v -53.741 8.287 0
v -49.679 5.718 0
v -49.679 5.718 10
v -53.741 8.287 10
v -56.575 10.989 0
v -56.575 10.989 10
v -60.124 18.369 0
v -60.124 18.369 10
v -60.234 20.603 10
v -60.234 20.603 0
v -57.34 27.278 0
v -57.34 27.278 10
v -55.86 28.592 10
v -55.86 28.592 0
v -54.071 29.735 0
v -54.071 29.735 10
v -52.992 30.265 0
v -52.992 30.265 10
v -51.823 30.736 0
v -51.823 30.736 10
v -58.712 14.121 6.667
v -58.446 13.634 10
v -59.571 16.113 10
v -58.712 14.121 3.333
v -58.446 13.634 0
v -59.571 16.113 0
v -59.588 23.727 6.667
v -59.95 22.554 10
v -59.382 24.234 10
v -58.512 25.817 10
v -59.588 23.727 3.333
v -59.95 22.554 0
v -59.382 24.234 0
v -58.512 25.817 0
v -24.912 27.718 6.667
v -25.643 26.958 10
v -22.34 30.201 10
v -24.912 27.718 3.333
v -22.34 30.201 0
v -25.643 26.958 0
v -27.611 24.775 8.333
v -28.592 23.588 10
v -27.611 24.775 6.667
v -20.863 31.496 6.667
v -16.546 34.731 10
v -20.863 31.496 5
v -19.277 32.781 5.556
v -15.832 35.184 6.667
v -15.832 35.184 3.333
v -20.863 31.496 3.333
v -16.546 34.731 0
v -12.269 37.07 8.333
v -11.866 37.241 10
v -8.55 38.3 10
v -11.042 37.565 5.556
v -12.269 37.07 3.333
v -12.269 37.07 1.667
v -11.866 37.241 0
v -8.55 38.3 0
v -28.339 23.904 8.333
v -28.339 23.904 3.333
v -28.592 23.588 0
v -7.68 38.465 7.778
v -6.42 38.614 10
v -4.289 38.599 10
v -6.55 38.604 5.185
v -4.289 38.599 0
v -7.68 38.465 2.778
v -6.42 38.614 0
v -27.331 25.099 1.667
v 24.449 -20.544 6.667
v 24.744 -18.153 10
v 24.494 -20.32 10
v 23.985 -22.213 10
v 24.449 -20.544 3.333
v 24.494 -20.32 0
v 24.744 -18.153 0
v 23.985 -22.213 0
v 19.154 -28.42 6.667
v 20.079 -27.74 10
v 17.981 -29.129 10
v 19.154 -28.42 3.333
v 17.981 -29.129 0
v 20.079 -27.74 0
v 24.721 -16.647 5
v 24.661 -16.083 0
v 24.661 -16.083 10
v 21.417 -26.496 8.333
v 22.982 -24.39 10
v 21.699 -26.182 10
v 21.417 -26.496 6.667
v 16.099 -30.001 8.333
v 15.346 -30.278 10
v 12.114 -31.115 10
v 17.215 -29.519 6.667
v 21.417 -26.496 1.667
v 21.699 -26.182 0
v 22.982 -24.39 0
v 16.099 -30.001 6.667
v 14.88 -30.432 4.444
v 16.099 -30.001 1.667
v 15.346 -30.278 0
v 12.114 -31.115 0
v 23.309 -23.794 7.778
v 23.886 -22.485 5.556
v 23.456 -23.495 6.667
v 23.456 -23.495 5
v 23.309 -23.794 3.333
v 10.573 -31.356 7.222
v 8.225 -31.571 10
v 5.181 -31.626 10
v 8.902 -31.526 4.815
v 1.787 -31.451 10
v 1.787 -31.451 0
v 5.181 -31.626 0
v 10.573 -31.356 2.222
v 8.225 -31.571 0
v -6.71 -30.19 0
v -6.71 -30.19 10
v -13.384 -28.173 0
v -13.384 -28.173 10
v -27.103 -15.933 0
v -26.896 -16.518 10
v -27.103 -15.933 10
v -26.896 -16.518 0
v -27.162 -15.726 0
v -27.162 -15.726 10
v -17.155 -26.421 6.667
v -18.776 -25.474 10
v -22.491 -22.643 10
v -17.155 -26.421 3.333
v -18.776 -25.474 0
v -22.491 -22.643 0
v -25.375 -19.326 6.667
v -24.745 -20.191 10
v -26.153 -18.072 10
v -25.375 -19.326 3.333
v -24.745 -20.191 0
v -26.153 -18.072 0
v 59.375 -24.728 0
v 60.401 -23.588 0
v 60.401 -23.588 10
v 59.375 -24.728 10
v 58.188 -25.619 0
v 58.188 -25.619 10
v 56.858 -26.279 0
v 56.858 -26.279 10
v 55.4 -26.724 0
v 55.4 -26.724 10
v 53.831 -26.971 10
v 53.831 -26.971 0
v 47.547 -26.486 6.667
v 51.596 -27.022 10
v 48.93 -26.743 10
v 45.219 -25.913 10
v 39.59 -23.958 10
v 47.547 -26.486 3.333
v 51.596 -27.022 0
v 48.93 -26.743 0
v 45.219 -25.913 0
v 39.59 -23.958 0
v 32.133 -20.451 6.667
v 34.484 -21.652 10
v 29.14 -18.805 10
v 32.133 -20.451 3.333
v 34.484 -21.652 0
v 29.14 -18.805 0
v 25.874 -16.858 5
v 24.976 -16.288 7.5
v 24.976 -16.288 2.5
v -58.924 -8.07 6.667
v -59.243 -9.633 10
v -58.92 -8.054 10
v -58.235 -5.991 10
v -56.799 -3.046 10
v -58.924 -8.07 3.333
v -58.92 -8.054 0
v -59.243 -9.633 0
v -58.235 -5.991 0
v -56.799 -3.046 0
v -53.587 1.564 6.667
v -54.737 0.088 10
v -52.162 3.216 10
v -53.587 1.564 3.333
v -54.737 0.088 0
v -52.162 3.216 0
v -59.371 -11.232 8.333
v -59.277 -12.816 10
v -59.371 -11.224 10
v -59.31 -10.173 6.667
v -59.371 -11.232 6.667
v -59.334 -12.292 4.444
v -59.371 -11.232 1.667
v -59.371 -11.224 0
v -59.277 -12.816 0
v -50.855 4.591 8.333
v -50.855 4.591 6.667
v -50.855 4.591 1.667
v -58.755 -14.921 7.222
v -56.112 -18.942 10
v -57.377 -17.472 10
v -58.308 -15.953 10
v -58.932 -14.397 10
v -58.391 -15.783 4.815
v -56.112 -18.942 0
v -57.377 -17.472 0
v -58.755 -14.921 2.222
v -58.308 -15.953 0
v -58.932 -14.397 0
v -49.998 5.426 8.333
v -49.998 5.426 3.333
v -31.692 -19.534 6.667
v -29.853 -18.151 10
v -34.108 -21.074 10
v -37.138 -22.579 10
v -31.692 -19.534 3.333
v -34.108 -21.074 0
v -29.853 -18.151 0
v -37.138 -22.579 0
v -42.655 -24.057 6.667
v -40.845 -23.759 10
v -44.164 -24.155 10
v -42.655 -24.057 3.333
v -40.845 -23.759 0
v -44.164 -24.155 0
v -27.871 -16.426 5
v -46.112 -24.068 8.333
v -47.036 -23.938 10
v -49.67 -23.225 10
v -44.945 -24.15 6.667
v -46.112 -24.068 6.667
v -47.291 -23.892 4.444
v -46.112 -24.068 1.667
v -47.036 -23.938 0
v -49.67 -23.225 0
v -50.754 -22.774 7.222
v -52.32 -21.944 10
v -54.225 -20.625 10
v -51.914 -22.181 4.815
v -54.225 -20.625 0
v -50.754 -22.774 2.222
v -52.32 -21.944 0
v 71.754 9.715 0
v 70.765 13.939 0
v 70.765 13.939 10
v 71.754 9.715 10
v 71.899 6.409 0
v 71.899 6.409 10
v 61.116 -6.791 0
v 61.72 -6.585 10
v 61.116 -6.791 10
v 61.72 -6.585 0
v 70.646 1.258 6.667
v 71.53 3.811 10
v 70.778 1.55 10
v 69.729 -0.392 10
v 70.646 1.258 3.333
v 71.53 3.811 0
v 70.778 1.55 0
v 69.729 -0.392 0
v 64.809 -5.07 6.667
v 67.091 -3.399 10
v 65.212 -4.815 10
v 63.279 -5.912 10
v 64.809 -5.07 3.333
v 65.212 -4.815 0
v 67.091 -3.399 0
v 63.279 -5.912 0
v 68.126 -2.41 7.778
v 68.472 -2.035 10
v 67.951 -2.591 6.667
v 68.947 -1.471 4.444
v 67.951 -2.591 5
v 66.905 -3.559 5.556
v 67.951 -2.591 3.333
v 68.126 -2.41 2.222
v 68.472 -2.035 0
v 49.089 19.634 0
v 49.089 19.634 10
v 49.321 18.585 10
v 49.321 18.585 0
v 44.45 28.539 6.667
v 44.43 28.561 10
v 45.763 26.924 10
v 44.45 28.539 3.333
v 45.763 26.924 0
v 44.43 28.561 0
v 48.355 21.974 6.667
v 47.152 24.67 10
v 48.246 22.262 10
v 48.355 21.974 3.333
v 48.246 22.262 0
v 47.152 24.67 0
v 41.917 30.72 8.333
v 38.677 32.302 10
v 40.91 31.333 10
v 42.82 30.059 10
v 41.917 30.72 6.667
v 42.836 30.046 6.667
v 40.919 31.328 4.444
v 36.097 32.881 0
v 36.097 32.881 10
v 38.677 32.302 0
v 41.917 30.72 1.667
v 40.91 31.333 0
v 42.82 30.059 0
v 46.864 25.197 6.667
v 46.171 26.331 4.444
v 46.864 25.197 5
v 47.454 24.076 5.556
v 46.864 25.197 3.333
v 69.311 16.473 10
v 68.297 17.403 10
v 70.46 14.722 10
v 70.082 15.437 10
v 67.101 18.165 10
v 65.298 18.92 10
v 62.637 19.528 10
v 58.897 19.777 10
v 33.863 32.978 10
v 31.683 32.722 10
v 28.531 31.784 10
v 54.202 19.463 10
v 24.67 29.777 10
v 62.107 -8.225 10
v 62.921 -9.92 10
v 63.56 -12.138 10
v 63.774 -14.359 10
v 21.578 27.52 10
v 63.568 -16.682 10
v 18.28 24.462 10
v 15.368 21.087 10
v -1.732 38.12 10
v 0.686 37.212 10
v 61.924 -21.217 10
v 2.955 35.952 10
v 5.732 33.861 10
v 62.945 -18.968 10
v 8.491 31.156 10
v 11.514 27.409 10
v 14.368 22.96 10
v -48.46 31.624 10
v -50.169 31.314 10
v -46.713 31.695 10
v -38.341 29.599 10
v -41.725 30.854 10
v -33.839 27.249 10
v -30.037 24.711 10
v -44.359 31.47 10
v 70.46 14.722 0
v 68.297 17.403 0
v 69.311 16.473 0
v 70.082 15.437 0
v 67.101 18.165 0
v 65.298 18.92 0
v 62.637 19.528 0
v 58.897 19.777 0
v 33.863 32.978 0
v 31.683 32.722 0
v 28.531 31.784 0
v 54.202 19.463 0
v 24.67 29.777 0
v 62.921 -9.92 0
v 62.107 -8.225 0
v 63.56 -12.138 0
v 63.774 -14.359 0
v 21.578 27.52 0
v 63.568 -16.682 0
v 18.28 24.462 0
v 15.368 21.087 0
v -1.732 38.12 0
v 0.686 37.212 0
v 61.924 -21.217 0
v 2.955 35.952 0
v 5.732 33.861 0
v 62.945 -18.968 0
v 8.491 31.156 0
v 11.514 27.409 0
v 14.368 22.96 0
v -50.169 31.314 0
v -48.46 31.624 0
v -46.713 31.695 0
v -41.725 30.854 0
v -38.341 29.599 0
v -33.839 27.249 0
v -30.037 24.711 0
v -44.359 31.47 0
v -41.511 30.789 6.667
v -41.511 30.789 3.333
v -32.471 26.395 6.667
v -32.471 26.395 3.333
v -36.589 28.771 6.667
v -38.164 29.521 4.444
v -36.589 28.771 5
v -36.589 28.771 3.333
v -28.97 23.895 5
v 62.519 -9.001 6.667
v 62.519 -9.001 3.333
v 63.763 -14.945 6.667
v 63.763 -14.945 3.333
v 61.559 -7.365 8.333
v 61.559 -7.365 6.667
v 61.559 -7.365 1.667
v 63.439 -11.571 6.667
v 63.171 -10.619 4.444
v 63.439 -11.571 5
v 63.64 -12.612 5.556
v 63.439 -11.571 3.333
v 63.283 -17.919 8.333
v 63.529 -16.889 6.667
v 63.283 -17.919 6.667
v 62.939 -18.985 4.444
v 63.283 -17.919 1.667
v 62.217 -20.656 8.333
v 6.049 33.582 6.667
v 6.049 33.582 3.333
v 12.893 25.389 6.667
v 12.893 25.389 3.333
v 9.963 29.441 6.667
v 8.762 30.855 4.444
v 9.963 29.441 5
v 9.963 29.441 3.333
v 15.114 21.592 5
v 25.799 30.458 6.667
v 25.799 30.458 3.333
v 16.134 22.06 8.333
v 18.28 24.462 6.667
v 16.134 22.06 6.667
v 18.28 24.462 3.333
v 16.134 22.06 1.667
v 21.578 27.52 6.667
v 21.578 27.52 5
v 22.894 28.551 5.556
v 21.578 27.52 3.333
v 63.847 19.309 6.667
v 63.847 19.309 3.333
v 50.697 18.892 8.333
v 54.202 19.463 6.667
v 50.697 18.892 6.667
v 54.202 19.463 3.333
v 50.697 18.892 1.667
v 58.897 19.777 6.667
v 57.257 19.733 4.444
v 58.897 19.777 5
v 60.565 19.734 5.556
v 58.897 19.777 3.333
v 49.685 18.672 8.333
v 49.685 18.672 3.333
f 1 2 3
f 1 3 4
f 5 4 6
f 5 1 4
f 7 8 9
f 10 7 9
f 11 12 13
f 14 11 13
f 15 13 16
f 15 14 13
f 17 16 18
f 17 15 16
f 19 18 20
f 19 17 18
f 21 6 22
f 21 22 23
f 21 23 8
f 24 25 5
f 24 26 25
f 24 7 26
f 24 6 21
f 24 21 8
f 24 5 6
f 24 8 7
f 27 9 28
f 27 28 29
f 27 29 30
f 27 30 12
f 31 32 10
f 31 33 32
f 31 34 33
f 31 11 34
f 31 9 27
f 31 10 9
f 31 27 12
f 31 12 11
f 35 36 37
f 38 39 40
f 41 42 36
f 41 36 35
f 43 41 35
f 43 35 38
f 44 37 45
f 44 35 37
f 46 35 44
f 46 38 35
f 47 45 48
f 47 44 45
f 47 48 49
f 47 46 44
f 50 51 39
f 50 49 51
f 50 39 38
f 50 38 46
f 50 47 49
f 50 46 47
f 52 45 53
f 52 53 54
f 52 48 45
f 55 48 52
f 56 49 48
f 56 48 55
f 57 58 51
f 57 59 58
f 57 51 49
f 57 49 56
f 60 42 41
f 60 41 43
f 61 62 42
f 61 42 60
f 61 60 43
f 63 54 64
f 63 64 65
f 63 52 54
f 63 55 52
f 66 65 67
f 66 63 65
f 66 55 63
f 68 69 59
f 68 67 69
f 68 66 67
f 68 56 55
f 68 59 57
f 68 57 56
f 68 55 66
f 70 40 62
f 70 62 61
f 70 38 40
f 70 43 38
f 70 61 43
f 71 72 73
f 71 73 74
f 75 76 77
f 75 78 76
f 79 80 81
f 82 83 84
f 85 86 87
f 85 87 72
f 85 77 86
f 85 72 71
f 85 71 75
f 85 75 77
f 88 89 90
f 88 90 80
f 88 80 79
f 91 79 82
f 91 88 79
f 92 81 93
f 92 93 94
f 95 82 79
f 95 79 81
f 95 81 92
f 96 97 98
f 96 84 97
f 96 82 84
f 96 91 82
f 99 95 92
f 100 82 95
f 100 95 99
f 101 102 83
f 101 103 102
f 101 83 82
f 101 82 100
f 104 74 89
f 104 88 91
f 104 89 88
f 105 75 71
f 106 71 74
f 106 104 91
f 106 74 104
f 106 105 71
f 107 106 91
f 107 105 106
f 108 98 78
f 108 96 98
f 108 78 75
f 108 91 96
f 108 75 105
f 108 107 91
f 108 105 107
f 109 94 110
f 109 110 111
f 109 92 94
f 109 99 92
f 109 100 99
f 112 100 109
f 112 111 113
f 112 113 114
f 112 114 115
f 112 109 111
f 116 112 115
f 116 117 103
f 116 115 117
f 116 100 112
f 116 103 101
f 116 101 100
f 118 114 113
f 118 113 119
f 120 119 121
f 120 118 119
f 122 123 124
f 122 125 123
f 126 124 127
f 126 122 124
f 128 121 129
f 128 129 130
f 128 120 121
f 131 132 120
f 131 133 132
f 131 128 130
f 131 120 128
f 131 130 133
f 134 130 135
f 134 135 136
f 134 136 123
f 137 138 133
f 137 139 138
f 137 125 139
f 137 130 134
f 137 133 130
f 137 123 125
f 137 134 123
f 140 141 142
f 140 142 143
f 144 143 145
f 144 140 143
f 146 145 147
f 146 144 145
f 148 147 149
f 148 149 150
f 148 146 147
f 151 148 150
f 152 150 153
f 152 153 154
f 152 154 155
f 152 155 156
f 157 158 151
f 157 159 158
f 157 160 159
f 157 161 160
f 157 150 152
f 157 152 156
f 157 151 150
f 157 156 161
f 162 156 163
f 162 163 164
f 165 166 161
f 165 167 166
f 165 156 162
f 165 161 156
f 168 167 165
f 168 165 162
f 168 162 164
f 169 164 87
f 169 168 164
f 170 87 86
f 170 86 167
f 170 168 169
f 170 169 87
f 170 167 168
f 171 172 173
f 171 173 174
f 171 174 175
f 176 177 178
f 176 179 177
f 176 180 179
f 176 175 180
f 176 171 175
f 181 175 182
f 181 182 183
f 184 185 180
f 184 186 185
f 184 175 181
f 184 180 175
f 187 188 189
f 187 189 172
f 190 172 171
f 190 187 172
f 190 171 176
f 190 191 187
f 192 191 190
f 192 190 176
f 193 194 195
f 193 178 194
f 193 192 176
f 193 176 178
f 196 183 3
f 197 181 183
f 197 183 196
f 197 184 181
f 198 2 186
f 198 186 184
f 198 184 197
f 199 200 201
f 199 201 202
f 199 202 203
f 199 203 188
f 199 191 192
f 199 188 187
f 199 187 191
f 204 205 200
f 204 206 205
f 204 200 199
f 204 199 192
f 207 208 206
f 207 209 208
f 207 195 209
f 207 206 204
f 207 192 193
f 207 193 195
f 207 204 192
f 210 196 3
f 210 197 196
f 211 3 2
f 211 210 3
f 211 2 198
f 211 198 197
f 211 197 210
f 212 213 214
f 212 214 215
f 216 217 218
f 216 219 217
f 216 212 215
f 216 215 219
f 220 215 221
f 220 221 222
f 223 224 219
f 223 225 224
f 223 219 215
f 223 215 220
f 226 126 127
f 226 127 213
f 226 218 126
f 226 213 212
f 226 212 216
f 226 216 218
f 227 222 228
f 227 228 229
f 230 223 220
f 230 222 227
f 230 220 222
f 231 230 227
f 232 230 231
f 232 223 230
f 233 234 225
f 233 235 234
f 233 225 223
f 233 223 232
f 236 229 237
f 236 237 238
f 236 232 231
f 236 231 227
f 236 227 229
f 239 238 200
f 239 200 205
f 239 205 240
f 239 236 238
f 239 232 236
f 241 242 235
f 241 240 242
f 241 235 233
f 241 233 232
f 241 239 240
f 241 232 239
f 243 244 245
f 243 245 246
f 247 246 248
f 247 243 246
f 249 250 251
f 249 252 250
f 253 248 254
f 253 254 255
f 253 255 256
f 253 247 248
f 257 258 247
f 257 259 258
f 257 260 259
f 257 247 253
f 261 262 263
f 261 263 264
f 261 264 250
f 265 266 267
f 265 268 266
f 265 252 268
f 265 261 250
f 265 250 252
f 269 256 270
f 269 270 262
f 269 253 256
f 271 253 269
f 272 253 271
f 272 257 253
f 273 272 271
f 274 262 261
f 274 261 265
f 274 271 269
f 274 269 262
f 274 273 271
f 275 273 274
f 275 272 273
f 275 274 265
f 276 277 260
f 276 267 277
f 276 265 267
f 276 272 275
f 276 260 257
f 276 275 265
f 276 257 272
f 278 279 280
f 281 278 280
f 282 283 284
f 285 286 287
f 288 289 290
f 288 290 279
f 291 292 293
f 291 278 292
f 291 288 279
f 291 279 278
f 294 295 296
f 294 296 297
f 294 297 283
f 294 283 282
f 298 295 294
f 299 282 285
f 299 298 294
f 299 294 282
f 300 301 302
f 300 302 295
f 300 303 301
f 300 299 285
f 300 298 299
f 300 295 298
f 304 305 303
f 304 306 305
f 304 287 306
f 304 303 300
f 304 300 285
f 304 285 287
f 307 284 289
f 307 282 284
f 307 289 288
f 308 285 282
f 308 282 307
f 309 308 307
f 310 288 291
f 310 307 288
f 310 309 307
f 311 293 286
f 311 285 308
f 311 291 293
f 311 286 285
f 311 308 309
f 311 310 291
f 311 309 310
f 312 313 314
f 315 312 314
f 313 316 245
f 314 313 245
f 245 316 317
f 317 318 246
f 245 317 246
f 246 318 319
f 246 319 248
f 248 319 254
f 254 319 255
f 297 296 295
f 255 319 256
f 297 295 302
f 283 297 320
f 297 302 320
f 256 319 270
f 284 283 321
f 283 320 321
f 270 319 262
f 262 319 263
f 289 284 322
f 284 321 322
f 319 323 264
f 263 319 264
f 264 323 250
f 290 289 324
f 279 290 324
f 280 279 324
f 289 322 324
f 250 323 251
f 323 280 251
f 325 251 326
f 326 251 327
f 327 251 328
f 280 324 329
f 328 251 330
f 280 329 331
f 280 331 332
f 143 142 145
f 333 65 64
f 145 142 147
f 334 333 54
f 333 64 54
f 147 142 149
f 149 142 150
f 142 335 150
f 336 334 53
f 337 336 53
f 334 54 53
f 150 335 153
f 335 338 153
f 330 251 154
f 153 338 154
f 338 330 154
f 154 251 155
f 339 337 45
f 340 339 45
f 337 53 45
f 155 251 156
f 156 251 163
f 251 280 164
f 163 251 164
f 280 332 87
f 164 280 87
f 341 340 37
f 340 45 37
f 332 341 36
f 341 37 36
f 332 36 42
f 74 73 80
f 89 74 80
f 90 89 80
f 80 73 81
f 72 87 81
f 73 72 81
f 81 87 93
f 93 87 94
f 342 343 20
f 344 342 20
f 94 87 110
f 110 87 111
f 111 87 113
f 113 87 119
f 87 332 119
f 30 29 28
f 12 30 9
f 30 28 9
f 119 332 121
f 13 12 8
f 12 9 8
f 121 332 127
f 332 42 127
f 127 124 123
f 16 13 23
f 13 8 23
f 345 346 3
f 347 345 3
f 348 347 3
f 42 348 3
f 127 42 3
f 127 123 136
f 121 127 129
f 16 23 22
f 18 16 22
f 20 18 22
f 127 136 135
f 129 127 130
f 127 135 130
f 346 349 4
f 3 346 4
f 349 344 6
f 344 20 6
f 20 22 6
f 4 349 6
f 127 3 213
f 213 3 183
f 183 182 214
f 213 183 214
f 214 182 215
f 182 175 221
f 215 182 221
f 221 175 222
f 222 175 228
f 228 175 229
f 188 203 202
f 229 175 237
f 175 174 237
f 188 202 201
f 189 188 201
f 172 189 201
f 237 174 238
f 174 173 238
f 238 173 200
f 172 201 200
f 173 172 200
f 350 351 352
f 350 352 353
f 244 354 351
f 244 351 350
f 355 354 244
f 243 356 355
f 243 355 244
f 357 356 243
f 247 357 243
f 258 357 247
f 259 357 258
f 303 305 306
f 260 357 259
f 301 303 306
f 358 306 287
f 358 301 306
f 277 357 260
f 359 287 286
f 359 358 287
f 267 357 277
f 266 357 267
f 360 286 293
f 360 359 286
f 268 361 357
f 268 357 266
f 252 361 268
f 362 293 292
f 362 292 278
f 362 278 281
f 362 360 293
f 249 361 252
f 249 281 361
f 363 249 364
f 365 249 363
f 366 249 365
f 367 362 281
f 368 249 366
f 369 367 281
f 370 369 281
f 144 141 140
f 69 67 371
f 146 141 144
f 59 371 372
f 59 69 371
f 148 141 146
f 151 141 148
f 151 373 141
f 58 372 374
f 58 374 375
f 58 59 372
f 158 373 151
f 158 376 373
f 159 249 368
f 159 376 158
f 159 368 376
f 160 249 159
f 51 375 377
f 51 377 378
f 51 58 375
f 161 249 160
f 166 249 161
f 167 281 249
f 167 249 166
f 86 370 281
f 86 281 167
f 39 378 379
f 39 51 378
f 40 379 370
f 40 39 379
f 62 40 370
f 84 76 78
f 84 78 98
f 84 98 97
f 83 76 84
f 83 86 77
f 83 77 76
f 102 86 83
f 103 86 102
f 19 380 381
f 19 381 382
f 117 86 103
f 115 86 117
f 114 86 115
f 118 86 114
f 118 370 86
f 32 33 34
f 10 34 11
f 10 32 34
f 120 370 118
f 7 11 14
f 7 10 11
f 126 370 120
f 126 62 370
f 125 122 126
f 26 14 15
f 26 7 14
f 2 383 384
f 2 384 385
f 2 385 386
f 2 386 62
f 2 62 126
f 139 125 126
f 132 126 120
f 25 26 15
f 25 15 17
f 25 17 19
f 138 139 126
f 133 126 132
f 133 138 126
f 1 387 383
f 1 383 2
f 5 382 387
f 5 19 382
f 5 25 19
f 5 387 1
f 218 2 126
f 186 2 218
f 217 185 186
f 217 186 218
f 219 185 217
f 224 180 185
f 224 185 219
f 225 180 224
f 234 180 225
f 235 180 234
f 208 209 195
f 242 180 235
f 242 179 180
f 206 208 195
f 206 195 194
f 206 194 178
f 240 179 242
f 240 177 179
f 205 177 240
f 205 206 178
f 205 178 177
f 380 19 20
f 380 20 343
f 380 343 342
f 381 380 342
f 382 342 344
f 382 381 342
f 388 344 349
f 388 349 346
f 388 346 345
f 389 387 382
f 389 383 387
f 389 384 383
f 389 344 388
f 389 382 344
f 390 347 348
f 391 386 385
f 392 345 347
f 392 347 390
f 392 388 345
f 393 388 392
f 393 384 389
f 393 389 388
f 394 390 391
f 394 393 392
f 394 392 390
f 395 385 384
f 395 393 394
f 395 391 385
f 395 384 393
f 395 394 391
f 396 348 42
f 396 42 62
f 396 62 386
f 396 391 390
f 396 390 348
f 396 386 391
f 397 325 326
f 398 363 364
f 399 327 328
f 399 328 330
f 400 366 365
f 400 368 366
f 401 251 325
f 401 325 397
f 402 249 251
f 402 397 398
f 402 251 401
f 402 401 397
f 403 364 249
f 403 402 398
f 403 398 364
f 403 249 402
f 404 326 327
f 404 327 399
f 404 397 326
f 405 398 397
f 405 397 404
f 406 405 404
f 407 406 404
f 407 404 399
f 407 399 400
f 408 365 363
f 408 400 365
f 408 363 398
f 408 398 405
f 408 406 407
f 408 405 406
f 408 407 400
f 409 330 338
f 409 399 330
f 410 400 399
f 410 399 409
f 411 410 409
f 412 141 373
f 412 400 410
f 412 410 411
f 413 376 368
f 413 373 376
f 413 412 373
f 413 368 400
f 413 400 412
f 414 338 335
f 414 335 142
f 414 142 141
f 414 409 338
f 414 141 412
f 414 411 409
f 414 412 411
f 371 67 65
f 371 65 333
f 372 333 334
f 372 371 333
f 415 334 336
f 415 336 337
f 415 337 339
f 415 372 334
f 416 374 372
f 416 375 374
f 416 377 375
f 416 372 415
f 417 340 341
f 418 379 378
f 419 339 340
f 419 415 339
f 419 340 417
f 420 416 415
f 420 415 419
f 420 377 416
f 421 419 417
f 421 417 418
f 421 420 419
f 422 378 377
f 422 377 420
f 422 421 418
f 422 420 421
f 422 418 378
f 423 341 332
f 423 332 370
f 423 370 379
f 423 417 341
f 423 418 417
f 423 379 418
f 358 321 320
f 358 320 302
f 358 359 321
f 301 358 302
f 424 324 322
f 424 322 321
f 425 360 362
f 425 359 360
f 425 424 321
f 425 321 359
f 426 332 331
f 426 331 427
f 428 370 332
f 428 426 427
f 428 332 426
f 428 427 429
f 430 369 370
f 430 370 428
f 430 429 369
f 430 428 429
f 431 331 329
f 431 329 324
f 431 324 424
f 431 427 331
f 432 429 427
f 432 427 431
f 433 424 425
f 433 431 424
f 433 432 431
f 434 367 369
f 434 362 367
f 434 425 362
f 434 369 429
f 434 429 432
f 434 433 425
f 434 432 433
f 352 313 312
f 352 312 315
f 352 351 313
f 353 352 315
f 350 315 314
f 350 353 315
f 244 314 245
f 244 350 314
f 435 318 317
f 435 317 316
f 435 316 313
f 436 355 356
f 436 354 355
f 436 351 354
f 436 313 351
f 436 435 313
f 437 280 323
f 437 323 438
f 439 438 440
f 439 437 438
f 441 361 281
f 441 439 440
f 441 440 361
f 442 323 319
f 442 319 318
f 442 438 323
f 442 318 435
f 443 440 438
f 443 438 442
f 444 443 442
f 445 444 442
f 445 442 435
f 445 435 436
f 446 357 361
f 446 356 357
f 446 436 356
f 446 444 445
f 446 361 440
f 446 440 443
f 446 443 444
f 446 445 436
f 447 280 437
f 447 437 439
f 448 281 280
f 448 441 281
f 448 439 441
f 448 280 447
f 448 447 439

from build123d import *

# Parameters (mm, degrees)
EXTRUDE_DEPTH = 10


with BuildPart() as part:
    # path3336 → Extrude (new body)
    with BuildSketch(Plane(origin=(6.052701, 3.037905, 0), x_dir=(0, -1, 0), z_dir=(0, 0, -1))):
        with BuildLine():
            add(Edge.make_bspline(
                [(-27.698556, 57.875805), (-31.987366, 48.225986), (-20.550543, 34.644759), (-20.550543, 34.644759)],
                knots=[0, 0, 0, 0, 1, 1, 1, 1], degree=3))
            add(Edge.make_bspline(
                [(-20.550543, 34.644759), (-20.550543, 34.644759), (-36.633573, 22.135735), (-35.561372, 10.34151)],
                knots=[0, 0, 0, 0, 1, 1, 1, 1], degree=3))
            add(Edge.make_bspline(
                [(-35.561372, 10.34151), (-34.489167, -1.452715), (-18.048736, -9.315531), (-18.048736, -9.315531)],
                knots=[0, 0, 0, 0, 1, 1, 1, 1], degree=3))
            add(Edge.make_bspline(
                [(-18.048736, -9.315531), (-18.048736, -9.315531), (-31.272565, -18.965352), (-29.84296, -30.044777)],
                knots=[0, 0, 0, 0, 1, 1, 1, 1], degree=3))
            add(Edge.make_bspline(
                [(-29.84296, -30.044777), (-28.413357, -41.124198), (-15.546932, -43.268601), (-15.546932, -43.268601)],
                knots=[0, 0, 0, 0, 1, 1, 1, 1], degree=3))
            add(Edge.make_bspline(
                [(-15.546932, -43.268601), (-15.546932, -43.268601), (-20.27429, -61.656045), (-10.900722, -64.712644)],
                knots=[0, 0, 0, 0, 1, 1, 1, 1], degree=3))
            add(Edge.make_bspline(
                [(-10.900722, -64.712644), (5.53971, -70.073653), (9.82852, -55.062826), (9.82852, -55.062826)],
                knots=[0, 0, 0, 0, 1, 1, 1, 1], degree=3))
            add(Edge.make_bspline(
                [(9.82852, -55.062826), (9.82852, -55.062826), (16.976534, -61.496036), (26.626353, -54.348025)],
                knots=[0, 0, 0, 0, 1, 1, 1, 1], degree=3))
            add(Edge.make_bspline(
                [(26.626353, -54.348025), (37.524521, -46.275309), (19.120938, -18.607952), (19.120938, -18.607952)],
                knots=[0, 0, 0, 0, 1, 1, 1, 1], degree=3))
            add(Edge.make_bspline(
                [(19.120938, -18.607952), (19.120938, -18.607952), (36.633573, -21.467156), (34.489167, 4.265697)],
                knots=[0, 0, 0, 0, 1, 1, 1, 1], degree=3))
            add(Edge.make_bspline(
                [(34.489167, 4.265697), (32.344764, 29.99855), (18.763534, 33.215156), (18.763534, 33.215156)],
                knots=[0, 0, 0, 0, 1, 1, 1, 1], degree=3))
            add(Edge.make_bspline(
                [(18.763534, 33.215156), (18.763534, 33.215156), (35.36464, 48.774395), (21.980142, 62.164612)],
                knots=[0, 0, 0, 0, 1, 1, 1, 1], degree=3))
            add(Edge.make_bspline(
                [(21.980142, 62.164612), (11.904058, 72.245005), (-2.680508, 55.731399), (-2.680508, 55.731399)],
                knots=[0, 0, 0, 0, 1, 1, 1, 1], degree=3))
            add(Edge.make_bspline(
                [(-2.680508, 55.731399), (-9.214777, 68.682765), (-23.253633, 70.123036), (-27.698556, 57.875805)],
                knots=[0, 0, 0, 0, 1, 1, 1, 1], degree=3))
        make_face()
    extrude(amount=-EXTRUDE_DEPTH)


solid = part.part
